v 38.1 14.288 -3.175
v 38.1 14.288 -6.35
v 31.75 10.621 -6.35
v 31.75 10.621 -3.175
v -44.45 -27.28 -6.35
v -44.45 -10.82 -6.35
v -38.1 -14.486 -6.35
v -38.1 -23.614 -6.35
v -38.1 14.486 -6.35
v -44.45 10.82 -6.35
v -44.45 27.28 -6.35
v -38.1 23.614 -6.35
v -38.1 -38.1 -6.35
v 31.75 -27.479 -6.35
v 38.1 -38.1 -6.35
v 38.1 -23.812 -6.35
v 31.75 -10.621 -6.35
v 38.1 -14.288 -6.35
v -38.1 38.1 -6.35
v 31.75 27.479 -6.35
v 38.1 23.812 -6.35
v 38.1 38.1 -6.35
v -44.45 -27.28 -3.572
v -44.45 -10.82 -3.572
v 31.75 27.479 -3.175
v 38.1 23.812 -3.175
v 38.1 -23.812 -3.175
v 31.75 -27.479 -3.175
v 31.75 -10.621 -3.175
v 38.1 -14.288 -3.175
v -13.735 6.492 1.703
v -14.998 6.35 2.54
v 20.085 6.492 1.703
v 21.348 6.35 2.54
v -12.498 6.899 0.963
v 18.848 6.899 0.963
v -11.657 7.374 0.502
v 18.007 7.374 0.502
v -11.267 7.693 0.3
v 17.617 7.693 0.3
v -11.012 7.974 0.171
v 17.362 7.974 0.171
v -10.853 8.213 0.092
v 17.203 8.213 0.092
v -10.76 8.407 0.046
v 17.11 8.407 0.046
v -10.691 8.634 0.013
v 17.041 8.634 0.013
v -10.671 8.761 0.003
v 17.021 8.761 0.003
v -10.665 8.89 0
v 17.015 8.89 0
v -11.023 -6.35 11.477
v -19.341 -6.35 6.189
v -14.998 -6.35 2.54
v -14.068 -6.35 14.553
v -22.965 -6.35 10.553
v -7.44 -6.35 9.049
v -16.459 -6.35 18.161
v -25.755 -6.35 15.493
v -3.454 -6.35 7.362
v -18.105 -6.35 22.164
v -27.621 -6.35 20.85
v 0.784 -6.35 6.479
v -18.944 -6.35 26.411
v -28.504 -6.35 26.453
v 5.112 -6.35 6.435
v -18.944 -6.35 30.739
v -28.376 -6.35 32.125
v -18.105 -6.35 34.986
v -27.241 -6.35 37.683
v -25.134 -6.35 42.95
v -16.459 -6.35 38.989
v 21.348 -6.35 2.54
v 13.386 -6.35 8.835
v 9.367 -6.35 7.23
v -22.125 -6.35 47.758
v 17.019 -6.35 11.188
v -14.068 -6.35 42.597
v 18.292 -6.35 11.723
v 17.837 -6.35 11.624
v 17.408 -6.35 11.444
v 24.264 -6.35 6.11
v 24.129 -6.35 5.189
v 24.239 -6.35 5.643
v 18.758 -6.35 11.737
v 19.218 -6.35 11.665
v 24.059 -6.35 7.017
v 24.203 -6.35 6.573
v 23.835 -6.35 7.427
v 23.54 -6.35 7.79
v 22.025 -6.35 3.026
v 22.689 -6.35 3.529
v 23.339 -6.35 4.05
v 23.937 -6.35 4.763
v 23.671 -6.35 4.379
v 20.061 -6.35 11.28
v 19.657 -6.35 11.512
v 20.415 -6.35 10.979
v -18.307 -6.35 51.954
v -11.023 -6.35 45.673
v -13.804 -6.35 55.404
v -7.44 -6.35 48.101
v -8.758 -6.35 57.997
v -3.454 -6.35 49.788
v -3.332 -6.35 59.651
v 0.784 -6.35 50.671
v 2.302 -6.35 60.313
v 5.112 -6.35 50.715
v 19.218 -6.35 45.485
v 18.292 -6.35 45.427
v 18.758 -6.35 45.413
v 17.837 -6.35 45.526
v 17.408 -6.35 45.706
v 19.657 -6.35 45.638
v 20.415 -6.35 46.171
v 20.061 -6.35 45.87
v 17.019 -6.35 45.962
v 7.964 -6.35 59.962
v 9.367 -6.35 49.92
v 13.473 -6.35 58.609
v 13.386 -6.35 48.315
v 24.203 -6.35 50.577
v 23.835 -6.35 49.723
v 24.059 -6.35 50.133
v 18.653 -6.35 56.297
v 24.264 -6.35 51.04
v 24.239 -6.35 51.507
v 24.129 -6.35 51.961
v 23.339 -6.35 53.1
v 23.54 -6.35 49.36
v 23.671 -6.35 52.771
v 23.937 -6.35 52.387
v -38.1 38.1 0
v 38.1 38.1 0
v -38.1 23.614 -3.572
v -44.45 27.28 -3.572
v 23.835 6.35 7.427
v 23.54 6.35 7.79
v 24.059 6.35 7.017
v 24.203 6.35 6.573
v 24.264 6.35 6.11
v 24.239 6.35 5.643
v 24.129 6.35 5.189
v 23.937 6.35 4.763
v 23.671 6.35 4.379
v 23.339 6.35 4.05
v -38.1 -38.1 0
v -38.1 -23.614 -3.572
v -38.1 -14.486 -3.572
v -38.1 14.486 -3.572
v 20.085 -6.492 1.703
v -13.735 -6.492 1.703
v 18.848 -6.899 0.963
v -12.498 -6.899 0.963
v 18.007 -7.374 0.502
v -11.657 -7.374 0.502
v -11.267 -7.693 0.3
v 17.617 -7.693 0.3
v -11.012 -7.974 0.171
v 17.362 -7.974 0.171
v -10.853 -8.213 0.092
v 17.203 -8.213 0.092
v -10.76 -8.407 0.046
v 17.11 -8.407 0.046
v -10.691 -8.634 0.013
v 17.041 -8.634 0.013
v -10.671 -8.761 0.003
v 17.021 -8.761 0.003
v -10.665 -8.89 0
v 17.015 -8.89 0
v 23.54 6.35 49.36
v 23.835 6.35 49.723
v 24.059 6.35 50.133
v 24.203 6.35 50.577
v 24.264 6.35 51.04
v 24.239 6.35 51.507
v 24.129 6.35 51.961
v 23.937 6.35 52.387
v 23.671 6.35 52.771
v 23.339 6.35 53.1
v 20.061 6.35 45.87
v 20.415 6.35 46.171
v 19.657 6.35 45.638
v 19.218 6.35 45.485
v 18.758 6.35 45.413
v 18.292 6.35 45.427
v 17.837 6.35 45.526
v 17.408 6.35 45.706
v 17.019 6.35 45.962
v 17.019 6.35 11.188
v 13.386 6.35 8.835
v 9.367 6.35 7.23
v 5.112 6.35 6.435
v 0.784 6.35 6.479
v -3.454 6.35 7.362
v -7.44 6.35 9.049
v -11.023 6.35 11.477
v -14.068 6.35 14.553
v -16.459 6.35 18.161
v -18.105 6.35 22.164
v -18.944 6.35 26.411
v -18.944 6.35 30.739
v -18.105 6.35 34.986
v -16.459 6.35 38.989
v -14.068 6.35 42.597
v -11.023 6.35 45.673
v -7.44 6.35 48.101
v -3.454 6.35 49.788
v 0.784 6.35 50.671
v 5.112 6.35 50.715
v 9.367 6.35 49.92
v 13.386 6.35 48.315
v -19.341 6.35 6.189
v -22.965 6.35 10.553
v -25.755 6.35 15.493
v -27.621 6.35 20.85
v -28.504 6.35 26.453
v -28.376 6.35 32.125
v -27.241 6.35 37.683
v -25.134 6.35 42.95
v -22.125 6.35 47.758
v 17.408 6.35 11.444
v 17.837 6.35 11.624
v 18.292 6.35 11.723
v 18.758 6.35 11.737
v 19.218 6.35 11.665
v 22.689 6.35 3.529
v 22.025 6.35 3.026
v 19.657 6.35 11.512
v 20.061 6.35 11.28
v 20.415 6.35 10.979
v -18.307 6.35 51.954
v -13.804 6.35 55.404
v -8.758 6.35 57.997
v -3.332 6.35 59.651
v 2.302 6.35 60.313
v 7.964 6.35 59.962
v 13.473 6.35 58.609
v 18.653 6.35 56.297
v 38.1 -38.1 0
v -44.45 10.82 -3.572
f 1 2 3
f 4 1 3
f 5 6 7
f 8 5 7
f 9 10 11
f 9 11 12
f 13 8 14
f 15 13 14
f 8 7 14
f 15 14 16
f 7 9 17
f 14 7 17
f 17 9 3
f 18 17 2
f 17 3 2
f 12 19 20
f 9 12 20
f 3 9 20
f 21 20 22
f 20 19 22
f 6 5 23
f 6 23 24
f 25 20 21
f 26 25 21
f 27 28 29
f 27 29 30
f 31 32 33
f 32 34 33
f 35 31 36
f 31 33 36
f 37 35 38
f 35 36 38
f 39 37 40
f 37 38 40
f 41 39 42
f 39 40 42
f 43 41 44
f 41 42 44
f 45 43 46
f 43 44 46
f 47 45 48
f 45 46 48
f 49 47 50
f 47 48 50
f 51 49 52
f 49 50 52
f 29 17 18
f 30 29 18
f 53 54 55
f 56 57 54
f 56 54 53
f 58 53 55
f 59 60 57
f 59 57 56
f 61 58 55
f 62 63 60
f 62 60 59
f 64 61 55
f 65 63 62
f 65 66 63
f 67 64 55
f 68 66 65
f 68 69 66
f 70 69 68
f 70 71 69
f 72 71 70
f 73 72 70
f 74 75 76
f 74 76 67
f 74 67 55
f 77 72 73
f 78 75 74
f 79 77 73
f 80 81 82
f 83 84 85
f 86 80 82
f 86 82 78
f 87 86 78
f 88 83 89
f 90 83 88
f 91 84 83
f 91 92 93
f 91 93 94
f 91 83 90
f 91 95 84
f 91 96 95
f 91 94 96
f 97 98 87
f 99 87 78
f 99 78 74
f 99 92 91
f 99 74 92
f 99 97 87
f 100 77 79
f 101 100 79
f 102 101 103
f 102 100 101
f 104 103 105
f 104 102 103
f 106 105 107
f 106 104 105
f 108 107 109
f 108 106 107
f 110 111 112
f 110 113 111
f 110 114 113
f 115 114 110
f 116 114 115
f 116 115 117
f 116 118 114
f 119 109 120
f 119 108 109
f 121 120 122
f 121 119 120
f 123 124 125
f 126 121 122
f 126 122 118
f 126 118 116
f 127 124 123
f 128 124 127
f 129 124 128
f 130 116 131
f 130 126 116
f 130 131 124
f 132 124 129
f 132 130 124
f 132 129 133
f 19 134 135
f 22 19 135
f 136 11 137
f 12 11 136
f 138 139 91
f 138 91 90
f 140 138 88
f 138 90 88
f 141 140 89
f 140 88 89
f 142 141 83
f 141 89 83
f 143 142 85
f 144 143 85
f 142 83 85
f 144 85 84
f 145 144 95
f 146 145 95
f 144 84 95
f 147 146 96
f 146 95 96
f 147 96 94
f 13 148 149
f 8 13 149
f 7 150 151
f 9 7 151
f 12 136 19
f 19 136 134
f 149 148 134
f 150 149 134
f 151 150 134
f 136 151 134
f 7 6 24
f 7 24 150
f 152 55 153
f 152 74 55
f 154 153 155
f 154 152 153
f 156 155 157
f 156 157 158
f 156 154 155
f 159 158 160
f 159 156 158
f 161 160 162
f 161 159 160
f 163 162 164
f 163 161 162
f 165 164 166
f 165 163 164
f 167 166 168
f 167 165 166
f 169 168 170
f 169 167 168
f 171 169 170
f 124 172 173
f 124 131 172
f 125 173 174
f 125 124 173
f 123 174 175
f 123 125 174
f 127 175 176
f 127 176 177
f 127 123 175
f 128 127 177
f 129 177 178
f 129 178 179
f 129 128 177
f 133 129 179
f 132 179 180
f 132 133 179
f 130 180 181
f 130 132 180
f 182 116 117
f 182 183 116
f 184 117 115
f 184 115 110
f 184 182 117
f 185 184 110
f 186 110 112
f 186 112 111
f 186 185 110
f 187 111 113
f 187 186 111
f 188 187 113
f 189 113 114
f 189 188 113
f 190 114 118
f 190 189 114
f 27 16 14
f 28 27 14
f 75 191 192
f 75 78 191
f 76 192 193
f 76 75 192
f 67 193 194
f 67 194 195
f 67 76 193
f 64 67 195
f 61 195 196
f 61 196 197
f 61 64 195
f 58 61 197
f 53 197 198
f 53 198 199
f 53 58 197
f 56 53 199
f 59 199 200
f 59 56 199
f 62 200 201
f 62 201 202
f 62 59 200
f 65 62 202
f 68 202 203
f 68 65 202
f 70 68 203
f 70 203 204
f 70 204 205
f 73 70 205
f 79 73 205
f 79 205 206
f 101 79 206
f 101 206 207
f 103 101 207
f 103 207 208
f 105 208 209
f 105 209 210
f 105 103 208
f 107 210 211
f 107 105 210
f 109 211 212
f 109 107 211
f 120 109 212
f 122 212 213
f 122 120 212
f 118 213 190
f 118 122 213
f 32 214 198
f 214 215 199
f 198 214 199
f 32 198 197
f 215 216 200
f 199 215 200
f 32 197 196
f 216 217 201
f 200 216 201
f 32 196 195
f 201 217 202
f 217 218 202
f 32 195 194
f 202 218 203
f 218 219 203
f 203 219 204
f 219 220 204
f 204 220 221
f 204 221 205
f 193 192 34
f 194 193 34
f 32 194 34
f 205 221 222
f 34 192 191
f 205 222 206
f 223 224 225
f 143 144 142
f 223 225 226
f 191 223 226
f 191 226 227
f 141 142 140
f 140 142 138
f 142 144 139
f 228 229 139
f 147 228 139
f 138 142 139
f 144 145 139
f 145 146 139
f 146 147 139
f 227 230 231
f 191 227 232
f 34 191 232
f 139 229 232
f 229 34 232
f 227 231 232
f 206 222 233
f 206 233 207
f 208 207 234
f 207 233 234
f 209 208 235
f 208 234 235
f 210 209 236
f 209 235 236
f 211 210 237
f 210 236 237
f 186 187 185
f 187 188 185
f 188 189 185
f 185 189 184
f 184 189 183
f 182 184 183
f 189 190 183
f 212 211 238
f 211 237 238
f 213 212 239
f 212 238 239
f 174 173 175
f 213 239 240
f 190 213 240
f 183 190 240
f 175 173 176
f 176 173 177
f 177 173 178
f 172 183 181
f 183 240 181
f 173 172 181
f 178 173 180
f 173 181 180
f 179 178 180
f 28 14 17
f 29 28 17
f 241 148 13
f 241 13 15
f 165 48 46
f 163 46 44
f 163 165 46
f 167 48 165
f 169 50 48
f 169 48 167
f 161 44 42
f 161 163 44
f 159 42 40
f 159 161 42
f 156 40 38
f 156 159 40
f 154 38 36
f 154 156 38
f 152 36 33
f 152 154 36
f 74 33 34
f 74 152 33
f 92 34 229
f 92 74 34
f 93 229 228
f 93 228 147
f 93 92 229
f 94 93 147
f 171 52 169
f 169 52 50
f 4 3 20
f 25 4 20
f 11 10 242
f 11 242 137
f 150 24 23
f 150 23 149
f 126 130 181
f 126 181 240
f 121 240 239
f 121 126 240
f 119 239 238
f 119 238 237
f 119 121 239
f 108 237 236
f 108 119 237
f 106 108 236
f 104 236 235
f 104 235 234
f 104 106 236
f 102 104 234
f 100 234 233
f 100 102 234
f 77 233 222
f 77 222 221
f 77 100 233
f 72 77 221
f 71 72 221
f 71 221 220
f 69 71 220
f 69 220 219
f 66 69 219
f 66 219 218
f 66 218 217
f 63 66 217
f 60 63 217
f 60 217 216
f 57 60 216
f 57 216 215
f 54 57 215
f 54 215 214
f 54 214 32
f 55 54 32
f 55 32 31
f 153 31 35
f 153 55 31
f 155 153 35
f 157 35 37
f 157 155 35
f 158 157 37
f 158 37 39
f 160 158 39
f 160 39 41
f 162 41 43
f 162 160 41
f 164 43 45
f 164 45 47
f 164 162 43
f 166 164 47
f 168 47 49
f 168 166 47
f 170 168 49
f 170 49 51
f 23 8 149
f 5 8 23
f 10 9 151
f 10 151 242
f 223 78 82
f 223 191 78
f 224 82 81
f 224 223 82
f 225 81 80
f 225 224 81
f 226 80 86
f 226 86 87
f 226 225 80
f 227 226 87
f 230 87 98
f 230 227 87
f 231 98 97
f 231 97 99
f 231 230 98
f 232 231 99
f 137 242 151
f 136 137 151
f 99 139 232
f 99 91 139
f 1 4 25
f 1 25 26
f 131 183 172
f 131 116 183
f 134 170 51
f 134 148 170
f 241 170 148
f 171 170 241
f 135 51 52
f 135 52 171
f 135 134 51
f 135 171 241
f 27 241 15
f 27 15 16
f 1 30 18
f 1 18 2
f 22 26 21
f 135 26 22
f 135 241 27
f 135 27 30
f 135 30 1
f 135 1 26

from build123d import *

# Parameters (mm, degrees)
F0_W     = 76.2
F0_H     = 76.2
F2_DEPTH = 6.35
F3_DEPTH = 6.35
F4_R     = 2.54
F6_DEPTH = 3.175
F8_DEPTH = 2.778125


with BuildPart() as f2:
    # F0 (on Top) → F2 (new body)
    with BuildSketch(Plane.XY):
        Rectangle(F0_W, F0_H)
    extrude(amount=-F2_DEPTH)

    # F1 (on Front) → F3 (join, symmetric)
    with BuildSketch(Plane.XZ):
        with BuildLine():
            Line((18.72926, 44.45), (25.395371, 51.253571))
            ThreePointArc((25.395371, 51.253571), (-28.575, 28.575), (25.395371, 5.896429))
            Line((25.395371, 5.896429), (18.72926, 12.7))
            ThreePointArc((18.72926, 12.7), (-19.05, 28.575), (18.72926, 44.45))
        make_face()
    extrude(amount=F3_DEPTH, both=True)

    # F4
    f4_edges = [f2.edges().sort_by_distance(p)[0] for p in [
        (25.395371, 0, 51.253571),
        (18.72926, 0, 44.45),
        (18.72926, 0, 12.7),
        (25.395371, 0, 5.896429),
        (3.175, -6.35, 0),
        (3.175, 6.35, 0),
    ]]
    fillet(f4_edges, radius=F4_R)

    # F5 (on face) → F6 (cut)
    with BuildSketch(Plane(origin=(0, 0, -6.35), x_dir=(1, 0, 0), z_dir=(0, 0, -1))):
        Polygon((38.1, 14.2875), (38.1, 23.8125), (31.75, 27.478674), (31.75, 10.621326), align=None)
        Polygon((31.75, -10.621326), (31.75, -27.478674), (38.1, -23.8125), (38.1, -14.2875), align=None)
    extrude(amount=-F6_DEPTH, mode=Mode.SUBTRACT)

    # F7 (on face) → F8 (join)
    with BuildSketch(Plane(origin=(0, 0, -6.35), x_dir=(1, 0, 0), z_dir=(0, 0, -1))):
        Polygon((-38.1, 14.485938), (-38.1, 23.614063), (-44.45, 27.280237), (-44.45, 10.819763), align=None)
        Polygon((-38.1, -23.614063), (-38.1, -14.485938), (-44.45, -10.819763), (-44.45, -27.280237), align=None)
    extrude(amount=-F8_DEPTH)


solid = f2.part
